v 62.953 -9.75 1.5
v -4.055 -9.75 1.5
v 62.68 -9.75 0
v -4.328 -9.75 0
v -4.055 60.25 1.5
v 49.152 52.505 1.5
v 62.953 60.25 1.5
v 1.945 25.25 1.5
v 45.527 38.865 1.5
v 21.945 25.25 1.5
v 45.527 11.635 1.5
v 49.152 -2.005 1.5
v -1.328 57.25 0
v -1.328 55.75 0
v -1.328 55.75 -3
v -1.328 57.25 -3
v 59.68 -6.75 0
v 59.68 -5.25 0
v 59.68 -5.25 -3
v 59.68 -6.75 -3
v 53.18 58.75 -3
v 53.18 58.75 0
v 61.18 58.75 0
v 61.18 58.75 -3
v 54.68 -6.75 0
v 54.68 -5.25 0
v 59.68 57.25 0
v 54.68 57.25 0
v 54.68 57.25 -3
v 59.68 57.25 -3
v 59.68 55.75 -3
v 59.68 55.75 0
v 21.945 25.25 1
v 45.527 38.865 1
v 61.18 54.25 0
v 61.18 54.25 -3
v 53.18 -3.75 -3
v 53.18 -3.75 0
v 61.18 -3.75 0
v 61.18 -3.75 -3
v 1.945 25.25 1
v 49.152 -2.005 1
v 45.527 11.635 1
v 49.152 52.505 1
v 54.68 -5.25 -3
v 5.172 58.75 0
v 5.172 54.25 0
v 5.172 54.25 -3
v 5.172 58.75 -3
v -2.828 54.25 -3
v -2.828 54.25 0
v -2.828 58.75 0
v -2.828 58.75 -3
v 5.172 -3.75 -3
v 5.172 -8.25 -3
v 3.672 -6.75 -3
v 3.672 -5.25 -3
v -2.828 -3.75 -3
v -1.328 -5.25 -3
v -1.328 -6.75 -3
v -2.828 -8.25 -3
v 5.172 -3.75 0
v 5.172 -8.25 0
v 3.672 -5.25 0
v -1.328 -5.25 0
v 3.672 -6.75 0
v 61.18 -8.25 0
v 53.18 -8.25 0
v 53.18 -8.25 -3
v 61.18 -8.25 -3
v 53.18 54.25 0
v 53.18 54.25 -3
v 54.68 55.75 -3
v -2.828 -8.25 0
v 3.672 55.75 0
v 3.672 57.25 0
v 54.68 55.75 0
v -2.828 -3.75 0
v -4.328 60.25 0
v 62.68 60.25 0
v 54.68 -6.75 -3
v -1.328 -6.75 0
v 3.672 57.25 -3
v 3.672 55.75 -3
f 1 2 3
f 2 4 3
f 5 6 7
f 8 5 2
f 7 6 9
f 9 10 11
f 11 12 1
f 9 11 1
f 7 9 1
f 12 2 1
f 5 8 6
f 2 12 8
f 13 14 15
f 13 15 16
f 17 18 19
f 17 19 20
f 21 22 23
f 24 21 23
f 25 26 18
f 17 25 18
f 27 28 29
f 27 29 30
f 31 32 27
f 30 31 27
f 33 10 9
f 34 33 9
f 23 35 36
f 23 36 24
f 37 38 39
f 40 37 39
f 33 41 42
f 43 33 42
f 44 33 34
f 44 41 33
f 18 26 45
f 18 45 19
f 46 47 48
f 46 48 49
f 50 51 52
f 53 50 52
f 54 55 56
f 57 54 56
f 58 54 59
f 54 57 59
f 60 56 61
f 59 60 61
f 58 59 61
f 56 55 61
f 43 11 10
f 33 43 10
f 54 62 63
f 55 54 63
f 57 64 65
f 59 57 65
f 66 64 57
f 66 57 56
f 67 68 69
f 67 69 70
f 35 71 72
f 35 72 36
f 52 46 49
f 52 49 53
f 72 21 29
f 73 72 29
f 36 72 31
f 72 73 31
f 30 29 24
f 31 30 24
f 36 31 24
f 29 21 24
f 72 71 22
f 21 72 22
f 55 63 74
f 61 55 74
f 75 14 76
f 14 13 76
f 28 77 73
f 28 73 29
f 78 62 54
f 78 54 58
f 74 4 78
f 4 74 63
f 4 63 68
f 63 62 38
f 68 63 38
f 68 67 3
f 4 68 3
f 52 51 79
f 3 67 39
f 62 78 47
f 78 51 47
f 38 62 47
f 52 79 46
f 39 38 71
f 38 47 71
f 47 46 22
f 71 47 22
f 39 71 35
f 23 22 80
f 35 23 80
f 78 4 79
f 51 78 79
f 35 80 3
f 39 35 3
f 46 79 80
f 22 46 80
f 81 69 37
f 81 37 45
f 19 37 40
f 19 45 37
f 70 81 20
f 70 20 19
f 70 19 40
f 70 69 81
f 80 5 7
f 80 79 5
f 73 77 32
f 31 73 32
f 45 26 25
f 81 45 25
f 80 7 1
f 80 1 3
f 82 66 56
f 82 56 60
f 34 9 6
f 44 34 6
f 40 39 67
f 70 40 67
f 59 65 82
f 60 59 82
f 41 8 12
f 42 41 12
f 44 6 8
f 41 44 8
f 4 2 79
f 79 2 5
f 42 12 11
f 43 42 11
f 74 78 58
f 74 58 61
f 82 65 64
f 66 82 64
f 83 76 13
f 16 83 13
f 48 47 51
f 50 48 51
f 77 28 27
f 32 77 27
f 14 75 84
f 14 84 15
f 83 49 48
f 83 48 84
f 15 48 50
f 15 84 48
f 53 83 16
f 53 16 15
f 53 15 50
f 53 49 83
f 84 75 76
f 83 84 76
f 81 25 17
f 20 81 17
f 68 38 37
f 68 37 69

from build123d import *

# Parameters (mm, degrees)
SKETCH1_W                 = 67.008250425
SKETCH1_H                 = 70
BOSS_EXTRUDE1_DEPTH       = 1.5
BOSS_EXTRUDE2_START       = -9.75
BOSS_EXTRUDE2_DEPTH       = 70
CUT_EXTRUDE1_START        = -6
CUT_EXTRUDE1_OUTLINE_W    = 73
CUT_EXTRUDE1_OUTLINE_H    = 4
CUT_EXTRUDE1_DEPTH        = 1.741494861
SKETCH4_W                 = 8
SKETCH4_H                 = 4.5
SKETCH4_W_2               = 5
SKETCH4_H_2               = 1.5
BOSS_EXTRUDE3_DEPTH       = 3
MIRROR2_COPY_1_SKETCH_W   = 8
MIRROR2_COPY_1_SKETCH_H   = 4.5
MIRROR2_COPY_1_SKETCH_W_2 = 5
MIRROR2_COPY_1_SKETCH_H_2 = 1.5
MIRROR2_COPY_1_DEPTH      = 3
CUT_EXTRUDE2_DEPTH        = 0.5


with BuildPart() as part:
    # Sketch1 → Boss-Extrude1 (new body)
    with BuildSketch(Plane.XY):
        with Locations((29.175646202, 25.25)):
            Rectangle(SKETCH1_W, SKETCH1_H)
    extrude(amount=BOSS_EXTRUDE1_DEPTH)

    # Boss-Extrude2: read off the stored shape, not the designer's step
    # Boss-Extrude2 outline → Boss-Extrude2 (add)
    with BuildSketch(Plane(origin=(0, 0, 0), x_dir=(1, 0, 0), z_dir=(0, 1, 0)).offset(BOSS_EXTRUDE2_START)):
        Polygon((62.952808957, -1.5), (62.679771414, 0), (62.679771414, -1.5), align=None)
    extrude(amount=BOSS_EXTRUDE2_DEPTH)

    # Cut-Extrude1: read off the stored shape, not the designer's step
    # Cut-Extrude1 outline → Cut-Extrude1 (cut)
    with BuildSketch(Plane(origin=(0, 0, 0), x_dir=(0, 1, 0), z_dir=(0.9838340738940914, 0, -0.17908242528220206)).offset(CUT_EXTRUDE1_START)):
        with Locations((25.5, 0)):
            Rectangle(CUT_EXTRUDE1_OUTLINE_W, CUT_EXTRUDE1_OUTLINE_H)
    extrude(amount=CUT_EXTRUDE1_DEPTH, mode=Mode.SUBTRACT)

    # Sketch4 → Boss-Extrude3 (add)
    with BuildSketch(Plane(origin=(0, 0, 0), x_dir=(-1, 0, 0), z_dir=(0, 0, -1))):
        with Locations((-1.171520989, 56.5)):
            Rectangle(SKETCH4_W, SKETCH4_H)
        with Locations((-1.171520989, 56.5)):
            Rectangle(SKETCH4_W_2, SKETCH4_H_2, mode=Mode.SUBTRACT)
    boss_extrude3 = extrude(amount=BOSS_EXTRUDE3_DEPTH)

    # Mirror1: Boss-Extrude3 across plane
    add(boss_extrude3.mirror(Plane(origin=(29.175646202, 0, 0), x_dir=(0, 0, 1), z_dir=(1, 0, 0))))

    # Mirror2: Boss-Extrude3 across plane
    add(boss_extrude3.mirror(Plane(origin=(0, 25.25, 0), x_dir=(0, 0, 1), z_dir=(0, -1, 0))))

    # Mirror2 copy 1 sketch → Mirror2 copy 1 (add)
    with BuildSketch(Plane(origin=(58.351292403, 50.5, 0), x_dir=(1, 0, 0), z_dir=(0, 0, -1))):
        with Locations((-1.171520989, 56.5)):
            Rectangle(MIRROR2_COPY_1_SKETCH_W, MIRROR2_COPY_1_SKETCH_H)
        with Locations((-1.171520989, 56.5)):
            Rectangle(MIRROR2_COPY_1_SKETCH_W_2, MIRROR2_COPY_1_SKETCH_H_2, mode=Mode.SUBTRACT)
    extrude(amount=MIRROR2_COPY_1_DEPTH)

    # Sketch6 → Cut-Extrude2 (cut)
    with BuildSketch(Plane.XY.offset(1.5)):
        Polygon((45.526638666, 38.865120313), (49.152363366, 52.505438829), (1.944558532, 25.25), (49.152363366, -2.005438829), (45.526638666, 11.634879687), (21.944558532, 25.25), align=None)
    extrude(amount=-CUT_EXTRUDE2_DEPTH, mode=Mode.SUBTRACT)


solid = part.part
